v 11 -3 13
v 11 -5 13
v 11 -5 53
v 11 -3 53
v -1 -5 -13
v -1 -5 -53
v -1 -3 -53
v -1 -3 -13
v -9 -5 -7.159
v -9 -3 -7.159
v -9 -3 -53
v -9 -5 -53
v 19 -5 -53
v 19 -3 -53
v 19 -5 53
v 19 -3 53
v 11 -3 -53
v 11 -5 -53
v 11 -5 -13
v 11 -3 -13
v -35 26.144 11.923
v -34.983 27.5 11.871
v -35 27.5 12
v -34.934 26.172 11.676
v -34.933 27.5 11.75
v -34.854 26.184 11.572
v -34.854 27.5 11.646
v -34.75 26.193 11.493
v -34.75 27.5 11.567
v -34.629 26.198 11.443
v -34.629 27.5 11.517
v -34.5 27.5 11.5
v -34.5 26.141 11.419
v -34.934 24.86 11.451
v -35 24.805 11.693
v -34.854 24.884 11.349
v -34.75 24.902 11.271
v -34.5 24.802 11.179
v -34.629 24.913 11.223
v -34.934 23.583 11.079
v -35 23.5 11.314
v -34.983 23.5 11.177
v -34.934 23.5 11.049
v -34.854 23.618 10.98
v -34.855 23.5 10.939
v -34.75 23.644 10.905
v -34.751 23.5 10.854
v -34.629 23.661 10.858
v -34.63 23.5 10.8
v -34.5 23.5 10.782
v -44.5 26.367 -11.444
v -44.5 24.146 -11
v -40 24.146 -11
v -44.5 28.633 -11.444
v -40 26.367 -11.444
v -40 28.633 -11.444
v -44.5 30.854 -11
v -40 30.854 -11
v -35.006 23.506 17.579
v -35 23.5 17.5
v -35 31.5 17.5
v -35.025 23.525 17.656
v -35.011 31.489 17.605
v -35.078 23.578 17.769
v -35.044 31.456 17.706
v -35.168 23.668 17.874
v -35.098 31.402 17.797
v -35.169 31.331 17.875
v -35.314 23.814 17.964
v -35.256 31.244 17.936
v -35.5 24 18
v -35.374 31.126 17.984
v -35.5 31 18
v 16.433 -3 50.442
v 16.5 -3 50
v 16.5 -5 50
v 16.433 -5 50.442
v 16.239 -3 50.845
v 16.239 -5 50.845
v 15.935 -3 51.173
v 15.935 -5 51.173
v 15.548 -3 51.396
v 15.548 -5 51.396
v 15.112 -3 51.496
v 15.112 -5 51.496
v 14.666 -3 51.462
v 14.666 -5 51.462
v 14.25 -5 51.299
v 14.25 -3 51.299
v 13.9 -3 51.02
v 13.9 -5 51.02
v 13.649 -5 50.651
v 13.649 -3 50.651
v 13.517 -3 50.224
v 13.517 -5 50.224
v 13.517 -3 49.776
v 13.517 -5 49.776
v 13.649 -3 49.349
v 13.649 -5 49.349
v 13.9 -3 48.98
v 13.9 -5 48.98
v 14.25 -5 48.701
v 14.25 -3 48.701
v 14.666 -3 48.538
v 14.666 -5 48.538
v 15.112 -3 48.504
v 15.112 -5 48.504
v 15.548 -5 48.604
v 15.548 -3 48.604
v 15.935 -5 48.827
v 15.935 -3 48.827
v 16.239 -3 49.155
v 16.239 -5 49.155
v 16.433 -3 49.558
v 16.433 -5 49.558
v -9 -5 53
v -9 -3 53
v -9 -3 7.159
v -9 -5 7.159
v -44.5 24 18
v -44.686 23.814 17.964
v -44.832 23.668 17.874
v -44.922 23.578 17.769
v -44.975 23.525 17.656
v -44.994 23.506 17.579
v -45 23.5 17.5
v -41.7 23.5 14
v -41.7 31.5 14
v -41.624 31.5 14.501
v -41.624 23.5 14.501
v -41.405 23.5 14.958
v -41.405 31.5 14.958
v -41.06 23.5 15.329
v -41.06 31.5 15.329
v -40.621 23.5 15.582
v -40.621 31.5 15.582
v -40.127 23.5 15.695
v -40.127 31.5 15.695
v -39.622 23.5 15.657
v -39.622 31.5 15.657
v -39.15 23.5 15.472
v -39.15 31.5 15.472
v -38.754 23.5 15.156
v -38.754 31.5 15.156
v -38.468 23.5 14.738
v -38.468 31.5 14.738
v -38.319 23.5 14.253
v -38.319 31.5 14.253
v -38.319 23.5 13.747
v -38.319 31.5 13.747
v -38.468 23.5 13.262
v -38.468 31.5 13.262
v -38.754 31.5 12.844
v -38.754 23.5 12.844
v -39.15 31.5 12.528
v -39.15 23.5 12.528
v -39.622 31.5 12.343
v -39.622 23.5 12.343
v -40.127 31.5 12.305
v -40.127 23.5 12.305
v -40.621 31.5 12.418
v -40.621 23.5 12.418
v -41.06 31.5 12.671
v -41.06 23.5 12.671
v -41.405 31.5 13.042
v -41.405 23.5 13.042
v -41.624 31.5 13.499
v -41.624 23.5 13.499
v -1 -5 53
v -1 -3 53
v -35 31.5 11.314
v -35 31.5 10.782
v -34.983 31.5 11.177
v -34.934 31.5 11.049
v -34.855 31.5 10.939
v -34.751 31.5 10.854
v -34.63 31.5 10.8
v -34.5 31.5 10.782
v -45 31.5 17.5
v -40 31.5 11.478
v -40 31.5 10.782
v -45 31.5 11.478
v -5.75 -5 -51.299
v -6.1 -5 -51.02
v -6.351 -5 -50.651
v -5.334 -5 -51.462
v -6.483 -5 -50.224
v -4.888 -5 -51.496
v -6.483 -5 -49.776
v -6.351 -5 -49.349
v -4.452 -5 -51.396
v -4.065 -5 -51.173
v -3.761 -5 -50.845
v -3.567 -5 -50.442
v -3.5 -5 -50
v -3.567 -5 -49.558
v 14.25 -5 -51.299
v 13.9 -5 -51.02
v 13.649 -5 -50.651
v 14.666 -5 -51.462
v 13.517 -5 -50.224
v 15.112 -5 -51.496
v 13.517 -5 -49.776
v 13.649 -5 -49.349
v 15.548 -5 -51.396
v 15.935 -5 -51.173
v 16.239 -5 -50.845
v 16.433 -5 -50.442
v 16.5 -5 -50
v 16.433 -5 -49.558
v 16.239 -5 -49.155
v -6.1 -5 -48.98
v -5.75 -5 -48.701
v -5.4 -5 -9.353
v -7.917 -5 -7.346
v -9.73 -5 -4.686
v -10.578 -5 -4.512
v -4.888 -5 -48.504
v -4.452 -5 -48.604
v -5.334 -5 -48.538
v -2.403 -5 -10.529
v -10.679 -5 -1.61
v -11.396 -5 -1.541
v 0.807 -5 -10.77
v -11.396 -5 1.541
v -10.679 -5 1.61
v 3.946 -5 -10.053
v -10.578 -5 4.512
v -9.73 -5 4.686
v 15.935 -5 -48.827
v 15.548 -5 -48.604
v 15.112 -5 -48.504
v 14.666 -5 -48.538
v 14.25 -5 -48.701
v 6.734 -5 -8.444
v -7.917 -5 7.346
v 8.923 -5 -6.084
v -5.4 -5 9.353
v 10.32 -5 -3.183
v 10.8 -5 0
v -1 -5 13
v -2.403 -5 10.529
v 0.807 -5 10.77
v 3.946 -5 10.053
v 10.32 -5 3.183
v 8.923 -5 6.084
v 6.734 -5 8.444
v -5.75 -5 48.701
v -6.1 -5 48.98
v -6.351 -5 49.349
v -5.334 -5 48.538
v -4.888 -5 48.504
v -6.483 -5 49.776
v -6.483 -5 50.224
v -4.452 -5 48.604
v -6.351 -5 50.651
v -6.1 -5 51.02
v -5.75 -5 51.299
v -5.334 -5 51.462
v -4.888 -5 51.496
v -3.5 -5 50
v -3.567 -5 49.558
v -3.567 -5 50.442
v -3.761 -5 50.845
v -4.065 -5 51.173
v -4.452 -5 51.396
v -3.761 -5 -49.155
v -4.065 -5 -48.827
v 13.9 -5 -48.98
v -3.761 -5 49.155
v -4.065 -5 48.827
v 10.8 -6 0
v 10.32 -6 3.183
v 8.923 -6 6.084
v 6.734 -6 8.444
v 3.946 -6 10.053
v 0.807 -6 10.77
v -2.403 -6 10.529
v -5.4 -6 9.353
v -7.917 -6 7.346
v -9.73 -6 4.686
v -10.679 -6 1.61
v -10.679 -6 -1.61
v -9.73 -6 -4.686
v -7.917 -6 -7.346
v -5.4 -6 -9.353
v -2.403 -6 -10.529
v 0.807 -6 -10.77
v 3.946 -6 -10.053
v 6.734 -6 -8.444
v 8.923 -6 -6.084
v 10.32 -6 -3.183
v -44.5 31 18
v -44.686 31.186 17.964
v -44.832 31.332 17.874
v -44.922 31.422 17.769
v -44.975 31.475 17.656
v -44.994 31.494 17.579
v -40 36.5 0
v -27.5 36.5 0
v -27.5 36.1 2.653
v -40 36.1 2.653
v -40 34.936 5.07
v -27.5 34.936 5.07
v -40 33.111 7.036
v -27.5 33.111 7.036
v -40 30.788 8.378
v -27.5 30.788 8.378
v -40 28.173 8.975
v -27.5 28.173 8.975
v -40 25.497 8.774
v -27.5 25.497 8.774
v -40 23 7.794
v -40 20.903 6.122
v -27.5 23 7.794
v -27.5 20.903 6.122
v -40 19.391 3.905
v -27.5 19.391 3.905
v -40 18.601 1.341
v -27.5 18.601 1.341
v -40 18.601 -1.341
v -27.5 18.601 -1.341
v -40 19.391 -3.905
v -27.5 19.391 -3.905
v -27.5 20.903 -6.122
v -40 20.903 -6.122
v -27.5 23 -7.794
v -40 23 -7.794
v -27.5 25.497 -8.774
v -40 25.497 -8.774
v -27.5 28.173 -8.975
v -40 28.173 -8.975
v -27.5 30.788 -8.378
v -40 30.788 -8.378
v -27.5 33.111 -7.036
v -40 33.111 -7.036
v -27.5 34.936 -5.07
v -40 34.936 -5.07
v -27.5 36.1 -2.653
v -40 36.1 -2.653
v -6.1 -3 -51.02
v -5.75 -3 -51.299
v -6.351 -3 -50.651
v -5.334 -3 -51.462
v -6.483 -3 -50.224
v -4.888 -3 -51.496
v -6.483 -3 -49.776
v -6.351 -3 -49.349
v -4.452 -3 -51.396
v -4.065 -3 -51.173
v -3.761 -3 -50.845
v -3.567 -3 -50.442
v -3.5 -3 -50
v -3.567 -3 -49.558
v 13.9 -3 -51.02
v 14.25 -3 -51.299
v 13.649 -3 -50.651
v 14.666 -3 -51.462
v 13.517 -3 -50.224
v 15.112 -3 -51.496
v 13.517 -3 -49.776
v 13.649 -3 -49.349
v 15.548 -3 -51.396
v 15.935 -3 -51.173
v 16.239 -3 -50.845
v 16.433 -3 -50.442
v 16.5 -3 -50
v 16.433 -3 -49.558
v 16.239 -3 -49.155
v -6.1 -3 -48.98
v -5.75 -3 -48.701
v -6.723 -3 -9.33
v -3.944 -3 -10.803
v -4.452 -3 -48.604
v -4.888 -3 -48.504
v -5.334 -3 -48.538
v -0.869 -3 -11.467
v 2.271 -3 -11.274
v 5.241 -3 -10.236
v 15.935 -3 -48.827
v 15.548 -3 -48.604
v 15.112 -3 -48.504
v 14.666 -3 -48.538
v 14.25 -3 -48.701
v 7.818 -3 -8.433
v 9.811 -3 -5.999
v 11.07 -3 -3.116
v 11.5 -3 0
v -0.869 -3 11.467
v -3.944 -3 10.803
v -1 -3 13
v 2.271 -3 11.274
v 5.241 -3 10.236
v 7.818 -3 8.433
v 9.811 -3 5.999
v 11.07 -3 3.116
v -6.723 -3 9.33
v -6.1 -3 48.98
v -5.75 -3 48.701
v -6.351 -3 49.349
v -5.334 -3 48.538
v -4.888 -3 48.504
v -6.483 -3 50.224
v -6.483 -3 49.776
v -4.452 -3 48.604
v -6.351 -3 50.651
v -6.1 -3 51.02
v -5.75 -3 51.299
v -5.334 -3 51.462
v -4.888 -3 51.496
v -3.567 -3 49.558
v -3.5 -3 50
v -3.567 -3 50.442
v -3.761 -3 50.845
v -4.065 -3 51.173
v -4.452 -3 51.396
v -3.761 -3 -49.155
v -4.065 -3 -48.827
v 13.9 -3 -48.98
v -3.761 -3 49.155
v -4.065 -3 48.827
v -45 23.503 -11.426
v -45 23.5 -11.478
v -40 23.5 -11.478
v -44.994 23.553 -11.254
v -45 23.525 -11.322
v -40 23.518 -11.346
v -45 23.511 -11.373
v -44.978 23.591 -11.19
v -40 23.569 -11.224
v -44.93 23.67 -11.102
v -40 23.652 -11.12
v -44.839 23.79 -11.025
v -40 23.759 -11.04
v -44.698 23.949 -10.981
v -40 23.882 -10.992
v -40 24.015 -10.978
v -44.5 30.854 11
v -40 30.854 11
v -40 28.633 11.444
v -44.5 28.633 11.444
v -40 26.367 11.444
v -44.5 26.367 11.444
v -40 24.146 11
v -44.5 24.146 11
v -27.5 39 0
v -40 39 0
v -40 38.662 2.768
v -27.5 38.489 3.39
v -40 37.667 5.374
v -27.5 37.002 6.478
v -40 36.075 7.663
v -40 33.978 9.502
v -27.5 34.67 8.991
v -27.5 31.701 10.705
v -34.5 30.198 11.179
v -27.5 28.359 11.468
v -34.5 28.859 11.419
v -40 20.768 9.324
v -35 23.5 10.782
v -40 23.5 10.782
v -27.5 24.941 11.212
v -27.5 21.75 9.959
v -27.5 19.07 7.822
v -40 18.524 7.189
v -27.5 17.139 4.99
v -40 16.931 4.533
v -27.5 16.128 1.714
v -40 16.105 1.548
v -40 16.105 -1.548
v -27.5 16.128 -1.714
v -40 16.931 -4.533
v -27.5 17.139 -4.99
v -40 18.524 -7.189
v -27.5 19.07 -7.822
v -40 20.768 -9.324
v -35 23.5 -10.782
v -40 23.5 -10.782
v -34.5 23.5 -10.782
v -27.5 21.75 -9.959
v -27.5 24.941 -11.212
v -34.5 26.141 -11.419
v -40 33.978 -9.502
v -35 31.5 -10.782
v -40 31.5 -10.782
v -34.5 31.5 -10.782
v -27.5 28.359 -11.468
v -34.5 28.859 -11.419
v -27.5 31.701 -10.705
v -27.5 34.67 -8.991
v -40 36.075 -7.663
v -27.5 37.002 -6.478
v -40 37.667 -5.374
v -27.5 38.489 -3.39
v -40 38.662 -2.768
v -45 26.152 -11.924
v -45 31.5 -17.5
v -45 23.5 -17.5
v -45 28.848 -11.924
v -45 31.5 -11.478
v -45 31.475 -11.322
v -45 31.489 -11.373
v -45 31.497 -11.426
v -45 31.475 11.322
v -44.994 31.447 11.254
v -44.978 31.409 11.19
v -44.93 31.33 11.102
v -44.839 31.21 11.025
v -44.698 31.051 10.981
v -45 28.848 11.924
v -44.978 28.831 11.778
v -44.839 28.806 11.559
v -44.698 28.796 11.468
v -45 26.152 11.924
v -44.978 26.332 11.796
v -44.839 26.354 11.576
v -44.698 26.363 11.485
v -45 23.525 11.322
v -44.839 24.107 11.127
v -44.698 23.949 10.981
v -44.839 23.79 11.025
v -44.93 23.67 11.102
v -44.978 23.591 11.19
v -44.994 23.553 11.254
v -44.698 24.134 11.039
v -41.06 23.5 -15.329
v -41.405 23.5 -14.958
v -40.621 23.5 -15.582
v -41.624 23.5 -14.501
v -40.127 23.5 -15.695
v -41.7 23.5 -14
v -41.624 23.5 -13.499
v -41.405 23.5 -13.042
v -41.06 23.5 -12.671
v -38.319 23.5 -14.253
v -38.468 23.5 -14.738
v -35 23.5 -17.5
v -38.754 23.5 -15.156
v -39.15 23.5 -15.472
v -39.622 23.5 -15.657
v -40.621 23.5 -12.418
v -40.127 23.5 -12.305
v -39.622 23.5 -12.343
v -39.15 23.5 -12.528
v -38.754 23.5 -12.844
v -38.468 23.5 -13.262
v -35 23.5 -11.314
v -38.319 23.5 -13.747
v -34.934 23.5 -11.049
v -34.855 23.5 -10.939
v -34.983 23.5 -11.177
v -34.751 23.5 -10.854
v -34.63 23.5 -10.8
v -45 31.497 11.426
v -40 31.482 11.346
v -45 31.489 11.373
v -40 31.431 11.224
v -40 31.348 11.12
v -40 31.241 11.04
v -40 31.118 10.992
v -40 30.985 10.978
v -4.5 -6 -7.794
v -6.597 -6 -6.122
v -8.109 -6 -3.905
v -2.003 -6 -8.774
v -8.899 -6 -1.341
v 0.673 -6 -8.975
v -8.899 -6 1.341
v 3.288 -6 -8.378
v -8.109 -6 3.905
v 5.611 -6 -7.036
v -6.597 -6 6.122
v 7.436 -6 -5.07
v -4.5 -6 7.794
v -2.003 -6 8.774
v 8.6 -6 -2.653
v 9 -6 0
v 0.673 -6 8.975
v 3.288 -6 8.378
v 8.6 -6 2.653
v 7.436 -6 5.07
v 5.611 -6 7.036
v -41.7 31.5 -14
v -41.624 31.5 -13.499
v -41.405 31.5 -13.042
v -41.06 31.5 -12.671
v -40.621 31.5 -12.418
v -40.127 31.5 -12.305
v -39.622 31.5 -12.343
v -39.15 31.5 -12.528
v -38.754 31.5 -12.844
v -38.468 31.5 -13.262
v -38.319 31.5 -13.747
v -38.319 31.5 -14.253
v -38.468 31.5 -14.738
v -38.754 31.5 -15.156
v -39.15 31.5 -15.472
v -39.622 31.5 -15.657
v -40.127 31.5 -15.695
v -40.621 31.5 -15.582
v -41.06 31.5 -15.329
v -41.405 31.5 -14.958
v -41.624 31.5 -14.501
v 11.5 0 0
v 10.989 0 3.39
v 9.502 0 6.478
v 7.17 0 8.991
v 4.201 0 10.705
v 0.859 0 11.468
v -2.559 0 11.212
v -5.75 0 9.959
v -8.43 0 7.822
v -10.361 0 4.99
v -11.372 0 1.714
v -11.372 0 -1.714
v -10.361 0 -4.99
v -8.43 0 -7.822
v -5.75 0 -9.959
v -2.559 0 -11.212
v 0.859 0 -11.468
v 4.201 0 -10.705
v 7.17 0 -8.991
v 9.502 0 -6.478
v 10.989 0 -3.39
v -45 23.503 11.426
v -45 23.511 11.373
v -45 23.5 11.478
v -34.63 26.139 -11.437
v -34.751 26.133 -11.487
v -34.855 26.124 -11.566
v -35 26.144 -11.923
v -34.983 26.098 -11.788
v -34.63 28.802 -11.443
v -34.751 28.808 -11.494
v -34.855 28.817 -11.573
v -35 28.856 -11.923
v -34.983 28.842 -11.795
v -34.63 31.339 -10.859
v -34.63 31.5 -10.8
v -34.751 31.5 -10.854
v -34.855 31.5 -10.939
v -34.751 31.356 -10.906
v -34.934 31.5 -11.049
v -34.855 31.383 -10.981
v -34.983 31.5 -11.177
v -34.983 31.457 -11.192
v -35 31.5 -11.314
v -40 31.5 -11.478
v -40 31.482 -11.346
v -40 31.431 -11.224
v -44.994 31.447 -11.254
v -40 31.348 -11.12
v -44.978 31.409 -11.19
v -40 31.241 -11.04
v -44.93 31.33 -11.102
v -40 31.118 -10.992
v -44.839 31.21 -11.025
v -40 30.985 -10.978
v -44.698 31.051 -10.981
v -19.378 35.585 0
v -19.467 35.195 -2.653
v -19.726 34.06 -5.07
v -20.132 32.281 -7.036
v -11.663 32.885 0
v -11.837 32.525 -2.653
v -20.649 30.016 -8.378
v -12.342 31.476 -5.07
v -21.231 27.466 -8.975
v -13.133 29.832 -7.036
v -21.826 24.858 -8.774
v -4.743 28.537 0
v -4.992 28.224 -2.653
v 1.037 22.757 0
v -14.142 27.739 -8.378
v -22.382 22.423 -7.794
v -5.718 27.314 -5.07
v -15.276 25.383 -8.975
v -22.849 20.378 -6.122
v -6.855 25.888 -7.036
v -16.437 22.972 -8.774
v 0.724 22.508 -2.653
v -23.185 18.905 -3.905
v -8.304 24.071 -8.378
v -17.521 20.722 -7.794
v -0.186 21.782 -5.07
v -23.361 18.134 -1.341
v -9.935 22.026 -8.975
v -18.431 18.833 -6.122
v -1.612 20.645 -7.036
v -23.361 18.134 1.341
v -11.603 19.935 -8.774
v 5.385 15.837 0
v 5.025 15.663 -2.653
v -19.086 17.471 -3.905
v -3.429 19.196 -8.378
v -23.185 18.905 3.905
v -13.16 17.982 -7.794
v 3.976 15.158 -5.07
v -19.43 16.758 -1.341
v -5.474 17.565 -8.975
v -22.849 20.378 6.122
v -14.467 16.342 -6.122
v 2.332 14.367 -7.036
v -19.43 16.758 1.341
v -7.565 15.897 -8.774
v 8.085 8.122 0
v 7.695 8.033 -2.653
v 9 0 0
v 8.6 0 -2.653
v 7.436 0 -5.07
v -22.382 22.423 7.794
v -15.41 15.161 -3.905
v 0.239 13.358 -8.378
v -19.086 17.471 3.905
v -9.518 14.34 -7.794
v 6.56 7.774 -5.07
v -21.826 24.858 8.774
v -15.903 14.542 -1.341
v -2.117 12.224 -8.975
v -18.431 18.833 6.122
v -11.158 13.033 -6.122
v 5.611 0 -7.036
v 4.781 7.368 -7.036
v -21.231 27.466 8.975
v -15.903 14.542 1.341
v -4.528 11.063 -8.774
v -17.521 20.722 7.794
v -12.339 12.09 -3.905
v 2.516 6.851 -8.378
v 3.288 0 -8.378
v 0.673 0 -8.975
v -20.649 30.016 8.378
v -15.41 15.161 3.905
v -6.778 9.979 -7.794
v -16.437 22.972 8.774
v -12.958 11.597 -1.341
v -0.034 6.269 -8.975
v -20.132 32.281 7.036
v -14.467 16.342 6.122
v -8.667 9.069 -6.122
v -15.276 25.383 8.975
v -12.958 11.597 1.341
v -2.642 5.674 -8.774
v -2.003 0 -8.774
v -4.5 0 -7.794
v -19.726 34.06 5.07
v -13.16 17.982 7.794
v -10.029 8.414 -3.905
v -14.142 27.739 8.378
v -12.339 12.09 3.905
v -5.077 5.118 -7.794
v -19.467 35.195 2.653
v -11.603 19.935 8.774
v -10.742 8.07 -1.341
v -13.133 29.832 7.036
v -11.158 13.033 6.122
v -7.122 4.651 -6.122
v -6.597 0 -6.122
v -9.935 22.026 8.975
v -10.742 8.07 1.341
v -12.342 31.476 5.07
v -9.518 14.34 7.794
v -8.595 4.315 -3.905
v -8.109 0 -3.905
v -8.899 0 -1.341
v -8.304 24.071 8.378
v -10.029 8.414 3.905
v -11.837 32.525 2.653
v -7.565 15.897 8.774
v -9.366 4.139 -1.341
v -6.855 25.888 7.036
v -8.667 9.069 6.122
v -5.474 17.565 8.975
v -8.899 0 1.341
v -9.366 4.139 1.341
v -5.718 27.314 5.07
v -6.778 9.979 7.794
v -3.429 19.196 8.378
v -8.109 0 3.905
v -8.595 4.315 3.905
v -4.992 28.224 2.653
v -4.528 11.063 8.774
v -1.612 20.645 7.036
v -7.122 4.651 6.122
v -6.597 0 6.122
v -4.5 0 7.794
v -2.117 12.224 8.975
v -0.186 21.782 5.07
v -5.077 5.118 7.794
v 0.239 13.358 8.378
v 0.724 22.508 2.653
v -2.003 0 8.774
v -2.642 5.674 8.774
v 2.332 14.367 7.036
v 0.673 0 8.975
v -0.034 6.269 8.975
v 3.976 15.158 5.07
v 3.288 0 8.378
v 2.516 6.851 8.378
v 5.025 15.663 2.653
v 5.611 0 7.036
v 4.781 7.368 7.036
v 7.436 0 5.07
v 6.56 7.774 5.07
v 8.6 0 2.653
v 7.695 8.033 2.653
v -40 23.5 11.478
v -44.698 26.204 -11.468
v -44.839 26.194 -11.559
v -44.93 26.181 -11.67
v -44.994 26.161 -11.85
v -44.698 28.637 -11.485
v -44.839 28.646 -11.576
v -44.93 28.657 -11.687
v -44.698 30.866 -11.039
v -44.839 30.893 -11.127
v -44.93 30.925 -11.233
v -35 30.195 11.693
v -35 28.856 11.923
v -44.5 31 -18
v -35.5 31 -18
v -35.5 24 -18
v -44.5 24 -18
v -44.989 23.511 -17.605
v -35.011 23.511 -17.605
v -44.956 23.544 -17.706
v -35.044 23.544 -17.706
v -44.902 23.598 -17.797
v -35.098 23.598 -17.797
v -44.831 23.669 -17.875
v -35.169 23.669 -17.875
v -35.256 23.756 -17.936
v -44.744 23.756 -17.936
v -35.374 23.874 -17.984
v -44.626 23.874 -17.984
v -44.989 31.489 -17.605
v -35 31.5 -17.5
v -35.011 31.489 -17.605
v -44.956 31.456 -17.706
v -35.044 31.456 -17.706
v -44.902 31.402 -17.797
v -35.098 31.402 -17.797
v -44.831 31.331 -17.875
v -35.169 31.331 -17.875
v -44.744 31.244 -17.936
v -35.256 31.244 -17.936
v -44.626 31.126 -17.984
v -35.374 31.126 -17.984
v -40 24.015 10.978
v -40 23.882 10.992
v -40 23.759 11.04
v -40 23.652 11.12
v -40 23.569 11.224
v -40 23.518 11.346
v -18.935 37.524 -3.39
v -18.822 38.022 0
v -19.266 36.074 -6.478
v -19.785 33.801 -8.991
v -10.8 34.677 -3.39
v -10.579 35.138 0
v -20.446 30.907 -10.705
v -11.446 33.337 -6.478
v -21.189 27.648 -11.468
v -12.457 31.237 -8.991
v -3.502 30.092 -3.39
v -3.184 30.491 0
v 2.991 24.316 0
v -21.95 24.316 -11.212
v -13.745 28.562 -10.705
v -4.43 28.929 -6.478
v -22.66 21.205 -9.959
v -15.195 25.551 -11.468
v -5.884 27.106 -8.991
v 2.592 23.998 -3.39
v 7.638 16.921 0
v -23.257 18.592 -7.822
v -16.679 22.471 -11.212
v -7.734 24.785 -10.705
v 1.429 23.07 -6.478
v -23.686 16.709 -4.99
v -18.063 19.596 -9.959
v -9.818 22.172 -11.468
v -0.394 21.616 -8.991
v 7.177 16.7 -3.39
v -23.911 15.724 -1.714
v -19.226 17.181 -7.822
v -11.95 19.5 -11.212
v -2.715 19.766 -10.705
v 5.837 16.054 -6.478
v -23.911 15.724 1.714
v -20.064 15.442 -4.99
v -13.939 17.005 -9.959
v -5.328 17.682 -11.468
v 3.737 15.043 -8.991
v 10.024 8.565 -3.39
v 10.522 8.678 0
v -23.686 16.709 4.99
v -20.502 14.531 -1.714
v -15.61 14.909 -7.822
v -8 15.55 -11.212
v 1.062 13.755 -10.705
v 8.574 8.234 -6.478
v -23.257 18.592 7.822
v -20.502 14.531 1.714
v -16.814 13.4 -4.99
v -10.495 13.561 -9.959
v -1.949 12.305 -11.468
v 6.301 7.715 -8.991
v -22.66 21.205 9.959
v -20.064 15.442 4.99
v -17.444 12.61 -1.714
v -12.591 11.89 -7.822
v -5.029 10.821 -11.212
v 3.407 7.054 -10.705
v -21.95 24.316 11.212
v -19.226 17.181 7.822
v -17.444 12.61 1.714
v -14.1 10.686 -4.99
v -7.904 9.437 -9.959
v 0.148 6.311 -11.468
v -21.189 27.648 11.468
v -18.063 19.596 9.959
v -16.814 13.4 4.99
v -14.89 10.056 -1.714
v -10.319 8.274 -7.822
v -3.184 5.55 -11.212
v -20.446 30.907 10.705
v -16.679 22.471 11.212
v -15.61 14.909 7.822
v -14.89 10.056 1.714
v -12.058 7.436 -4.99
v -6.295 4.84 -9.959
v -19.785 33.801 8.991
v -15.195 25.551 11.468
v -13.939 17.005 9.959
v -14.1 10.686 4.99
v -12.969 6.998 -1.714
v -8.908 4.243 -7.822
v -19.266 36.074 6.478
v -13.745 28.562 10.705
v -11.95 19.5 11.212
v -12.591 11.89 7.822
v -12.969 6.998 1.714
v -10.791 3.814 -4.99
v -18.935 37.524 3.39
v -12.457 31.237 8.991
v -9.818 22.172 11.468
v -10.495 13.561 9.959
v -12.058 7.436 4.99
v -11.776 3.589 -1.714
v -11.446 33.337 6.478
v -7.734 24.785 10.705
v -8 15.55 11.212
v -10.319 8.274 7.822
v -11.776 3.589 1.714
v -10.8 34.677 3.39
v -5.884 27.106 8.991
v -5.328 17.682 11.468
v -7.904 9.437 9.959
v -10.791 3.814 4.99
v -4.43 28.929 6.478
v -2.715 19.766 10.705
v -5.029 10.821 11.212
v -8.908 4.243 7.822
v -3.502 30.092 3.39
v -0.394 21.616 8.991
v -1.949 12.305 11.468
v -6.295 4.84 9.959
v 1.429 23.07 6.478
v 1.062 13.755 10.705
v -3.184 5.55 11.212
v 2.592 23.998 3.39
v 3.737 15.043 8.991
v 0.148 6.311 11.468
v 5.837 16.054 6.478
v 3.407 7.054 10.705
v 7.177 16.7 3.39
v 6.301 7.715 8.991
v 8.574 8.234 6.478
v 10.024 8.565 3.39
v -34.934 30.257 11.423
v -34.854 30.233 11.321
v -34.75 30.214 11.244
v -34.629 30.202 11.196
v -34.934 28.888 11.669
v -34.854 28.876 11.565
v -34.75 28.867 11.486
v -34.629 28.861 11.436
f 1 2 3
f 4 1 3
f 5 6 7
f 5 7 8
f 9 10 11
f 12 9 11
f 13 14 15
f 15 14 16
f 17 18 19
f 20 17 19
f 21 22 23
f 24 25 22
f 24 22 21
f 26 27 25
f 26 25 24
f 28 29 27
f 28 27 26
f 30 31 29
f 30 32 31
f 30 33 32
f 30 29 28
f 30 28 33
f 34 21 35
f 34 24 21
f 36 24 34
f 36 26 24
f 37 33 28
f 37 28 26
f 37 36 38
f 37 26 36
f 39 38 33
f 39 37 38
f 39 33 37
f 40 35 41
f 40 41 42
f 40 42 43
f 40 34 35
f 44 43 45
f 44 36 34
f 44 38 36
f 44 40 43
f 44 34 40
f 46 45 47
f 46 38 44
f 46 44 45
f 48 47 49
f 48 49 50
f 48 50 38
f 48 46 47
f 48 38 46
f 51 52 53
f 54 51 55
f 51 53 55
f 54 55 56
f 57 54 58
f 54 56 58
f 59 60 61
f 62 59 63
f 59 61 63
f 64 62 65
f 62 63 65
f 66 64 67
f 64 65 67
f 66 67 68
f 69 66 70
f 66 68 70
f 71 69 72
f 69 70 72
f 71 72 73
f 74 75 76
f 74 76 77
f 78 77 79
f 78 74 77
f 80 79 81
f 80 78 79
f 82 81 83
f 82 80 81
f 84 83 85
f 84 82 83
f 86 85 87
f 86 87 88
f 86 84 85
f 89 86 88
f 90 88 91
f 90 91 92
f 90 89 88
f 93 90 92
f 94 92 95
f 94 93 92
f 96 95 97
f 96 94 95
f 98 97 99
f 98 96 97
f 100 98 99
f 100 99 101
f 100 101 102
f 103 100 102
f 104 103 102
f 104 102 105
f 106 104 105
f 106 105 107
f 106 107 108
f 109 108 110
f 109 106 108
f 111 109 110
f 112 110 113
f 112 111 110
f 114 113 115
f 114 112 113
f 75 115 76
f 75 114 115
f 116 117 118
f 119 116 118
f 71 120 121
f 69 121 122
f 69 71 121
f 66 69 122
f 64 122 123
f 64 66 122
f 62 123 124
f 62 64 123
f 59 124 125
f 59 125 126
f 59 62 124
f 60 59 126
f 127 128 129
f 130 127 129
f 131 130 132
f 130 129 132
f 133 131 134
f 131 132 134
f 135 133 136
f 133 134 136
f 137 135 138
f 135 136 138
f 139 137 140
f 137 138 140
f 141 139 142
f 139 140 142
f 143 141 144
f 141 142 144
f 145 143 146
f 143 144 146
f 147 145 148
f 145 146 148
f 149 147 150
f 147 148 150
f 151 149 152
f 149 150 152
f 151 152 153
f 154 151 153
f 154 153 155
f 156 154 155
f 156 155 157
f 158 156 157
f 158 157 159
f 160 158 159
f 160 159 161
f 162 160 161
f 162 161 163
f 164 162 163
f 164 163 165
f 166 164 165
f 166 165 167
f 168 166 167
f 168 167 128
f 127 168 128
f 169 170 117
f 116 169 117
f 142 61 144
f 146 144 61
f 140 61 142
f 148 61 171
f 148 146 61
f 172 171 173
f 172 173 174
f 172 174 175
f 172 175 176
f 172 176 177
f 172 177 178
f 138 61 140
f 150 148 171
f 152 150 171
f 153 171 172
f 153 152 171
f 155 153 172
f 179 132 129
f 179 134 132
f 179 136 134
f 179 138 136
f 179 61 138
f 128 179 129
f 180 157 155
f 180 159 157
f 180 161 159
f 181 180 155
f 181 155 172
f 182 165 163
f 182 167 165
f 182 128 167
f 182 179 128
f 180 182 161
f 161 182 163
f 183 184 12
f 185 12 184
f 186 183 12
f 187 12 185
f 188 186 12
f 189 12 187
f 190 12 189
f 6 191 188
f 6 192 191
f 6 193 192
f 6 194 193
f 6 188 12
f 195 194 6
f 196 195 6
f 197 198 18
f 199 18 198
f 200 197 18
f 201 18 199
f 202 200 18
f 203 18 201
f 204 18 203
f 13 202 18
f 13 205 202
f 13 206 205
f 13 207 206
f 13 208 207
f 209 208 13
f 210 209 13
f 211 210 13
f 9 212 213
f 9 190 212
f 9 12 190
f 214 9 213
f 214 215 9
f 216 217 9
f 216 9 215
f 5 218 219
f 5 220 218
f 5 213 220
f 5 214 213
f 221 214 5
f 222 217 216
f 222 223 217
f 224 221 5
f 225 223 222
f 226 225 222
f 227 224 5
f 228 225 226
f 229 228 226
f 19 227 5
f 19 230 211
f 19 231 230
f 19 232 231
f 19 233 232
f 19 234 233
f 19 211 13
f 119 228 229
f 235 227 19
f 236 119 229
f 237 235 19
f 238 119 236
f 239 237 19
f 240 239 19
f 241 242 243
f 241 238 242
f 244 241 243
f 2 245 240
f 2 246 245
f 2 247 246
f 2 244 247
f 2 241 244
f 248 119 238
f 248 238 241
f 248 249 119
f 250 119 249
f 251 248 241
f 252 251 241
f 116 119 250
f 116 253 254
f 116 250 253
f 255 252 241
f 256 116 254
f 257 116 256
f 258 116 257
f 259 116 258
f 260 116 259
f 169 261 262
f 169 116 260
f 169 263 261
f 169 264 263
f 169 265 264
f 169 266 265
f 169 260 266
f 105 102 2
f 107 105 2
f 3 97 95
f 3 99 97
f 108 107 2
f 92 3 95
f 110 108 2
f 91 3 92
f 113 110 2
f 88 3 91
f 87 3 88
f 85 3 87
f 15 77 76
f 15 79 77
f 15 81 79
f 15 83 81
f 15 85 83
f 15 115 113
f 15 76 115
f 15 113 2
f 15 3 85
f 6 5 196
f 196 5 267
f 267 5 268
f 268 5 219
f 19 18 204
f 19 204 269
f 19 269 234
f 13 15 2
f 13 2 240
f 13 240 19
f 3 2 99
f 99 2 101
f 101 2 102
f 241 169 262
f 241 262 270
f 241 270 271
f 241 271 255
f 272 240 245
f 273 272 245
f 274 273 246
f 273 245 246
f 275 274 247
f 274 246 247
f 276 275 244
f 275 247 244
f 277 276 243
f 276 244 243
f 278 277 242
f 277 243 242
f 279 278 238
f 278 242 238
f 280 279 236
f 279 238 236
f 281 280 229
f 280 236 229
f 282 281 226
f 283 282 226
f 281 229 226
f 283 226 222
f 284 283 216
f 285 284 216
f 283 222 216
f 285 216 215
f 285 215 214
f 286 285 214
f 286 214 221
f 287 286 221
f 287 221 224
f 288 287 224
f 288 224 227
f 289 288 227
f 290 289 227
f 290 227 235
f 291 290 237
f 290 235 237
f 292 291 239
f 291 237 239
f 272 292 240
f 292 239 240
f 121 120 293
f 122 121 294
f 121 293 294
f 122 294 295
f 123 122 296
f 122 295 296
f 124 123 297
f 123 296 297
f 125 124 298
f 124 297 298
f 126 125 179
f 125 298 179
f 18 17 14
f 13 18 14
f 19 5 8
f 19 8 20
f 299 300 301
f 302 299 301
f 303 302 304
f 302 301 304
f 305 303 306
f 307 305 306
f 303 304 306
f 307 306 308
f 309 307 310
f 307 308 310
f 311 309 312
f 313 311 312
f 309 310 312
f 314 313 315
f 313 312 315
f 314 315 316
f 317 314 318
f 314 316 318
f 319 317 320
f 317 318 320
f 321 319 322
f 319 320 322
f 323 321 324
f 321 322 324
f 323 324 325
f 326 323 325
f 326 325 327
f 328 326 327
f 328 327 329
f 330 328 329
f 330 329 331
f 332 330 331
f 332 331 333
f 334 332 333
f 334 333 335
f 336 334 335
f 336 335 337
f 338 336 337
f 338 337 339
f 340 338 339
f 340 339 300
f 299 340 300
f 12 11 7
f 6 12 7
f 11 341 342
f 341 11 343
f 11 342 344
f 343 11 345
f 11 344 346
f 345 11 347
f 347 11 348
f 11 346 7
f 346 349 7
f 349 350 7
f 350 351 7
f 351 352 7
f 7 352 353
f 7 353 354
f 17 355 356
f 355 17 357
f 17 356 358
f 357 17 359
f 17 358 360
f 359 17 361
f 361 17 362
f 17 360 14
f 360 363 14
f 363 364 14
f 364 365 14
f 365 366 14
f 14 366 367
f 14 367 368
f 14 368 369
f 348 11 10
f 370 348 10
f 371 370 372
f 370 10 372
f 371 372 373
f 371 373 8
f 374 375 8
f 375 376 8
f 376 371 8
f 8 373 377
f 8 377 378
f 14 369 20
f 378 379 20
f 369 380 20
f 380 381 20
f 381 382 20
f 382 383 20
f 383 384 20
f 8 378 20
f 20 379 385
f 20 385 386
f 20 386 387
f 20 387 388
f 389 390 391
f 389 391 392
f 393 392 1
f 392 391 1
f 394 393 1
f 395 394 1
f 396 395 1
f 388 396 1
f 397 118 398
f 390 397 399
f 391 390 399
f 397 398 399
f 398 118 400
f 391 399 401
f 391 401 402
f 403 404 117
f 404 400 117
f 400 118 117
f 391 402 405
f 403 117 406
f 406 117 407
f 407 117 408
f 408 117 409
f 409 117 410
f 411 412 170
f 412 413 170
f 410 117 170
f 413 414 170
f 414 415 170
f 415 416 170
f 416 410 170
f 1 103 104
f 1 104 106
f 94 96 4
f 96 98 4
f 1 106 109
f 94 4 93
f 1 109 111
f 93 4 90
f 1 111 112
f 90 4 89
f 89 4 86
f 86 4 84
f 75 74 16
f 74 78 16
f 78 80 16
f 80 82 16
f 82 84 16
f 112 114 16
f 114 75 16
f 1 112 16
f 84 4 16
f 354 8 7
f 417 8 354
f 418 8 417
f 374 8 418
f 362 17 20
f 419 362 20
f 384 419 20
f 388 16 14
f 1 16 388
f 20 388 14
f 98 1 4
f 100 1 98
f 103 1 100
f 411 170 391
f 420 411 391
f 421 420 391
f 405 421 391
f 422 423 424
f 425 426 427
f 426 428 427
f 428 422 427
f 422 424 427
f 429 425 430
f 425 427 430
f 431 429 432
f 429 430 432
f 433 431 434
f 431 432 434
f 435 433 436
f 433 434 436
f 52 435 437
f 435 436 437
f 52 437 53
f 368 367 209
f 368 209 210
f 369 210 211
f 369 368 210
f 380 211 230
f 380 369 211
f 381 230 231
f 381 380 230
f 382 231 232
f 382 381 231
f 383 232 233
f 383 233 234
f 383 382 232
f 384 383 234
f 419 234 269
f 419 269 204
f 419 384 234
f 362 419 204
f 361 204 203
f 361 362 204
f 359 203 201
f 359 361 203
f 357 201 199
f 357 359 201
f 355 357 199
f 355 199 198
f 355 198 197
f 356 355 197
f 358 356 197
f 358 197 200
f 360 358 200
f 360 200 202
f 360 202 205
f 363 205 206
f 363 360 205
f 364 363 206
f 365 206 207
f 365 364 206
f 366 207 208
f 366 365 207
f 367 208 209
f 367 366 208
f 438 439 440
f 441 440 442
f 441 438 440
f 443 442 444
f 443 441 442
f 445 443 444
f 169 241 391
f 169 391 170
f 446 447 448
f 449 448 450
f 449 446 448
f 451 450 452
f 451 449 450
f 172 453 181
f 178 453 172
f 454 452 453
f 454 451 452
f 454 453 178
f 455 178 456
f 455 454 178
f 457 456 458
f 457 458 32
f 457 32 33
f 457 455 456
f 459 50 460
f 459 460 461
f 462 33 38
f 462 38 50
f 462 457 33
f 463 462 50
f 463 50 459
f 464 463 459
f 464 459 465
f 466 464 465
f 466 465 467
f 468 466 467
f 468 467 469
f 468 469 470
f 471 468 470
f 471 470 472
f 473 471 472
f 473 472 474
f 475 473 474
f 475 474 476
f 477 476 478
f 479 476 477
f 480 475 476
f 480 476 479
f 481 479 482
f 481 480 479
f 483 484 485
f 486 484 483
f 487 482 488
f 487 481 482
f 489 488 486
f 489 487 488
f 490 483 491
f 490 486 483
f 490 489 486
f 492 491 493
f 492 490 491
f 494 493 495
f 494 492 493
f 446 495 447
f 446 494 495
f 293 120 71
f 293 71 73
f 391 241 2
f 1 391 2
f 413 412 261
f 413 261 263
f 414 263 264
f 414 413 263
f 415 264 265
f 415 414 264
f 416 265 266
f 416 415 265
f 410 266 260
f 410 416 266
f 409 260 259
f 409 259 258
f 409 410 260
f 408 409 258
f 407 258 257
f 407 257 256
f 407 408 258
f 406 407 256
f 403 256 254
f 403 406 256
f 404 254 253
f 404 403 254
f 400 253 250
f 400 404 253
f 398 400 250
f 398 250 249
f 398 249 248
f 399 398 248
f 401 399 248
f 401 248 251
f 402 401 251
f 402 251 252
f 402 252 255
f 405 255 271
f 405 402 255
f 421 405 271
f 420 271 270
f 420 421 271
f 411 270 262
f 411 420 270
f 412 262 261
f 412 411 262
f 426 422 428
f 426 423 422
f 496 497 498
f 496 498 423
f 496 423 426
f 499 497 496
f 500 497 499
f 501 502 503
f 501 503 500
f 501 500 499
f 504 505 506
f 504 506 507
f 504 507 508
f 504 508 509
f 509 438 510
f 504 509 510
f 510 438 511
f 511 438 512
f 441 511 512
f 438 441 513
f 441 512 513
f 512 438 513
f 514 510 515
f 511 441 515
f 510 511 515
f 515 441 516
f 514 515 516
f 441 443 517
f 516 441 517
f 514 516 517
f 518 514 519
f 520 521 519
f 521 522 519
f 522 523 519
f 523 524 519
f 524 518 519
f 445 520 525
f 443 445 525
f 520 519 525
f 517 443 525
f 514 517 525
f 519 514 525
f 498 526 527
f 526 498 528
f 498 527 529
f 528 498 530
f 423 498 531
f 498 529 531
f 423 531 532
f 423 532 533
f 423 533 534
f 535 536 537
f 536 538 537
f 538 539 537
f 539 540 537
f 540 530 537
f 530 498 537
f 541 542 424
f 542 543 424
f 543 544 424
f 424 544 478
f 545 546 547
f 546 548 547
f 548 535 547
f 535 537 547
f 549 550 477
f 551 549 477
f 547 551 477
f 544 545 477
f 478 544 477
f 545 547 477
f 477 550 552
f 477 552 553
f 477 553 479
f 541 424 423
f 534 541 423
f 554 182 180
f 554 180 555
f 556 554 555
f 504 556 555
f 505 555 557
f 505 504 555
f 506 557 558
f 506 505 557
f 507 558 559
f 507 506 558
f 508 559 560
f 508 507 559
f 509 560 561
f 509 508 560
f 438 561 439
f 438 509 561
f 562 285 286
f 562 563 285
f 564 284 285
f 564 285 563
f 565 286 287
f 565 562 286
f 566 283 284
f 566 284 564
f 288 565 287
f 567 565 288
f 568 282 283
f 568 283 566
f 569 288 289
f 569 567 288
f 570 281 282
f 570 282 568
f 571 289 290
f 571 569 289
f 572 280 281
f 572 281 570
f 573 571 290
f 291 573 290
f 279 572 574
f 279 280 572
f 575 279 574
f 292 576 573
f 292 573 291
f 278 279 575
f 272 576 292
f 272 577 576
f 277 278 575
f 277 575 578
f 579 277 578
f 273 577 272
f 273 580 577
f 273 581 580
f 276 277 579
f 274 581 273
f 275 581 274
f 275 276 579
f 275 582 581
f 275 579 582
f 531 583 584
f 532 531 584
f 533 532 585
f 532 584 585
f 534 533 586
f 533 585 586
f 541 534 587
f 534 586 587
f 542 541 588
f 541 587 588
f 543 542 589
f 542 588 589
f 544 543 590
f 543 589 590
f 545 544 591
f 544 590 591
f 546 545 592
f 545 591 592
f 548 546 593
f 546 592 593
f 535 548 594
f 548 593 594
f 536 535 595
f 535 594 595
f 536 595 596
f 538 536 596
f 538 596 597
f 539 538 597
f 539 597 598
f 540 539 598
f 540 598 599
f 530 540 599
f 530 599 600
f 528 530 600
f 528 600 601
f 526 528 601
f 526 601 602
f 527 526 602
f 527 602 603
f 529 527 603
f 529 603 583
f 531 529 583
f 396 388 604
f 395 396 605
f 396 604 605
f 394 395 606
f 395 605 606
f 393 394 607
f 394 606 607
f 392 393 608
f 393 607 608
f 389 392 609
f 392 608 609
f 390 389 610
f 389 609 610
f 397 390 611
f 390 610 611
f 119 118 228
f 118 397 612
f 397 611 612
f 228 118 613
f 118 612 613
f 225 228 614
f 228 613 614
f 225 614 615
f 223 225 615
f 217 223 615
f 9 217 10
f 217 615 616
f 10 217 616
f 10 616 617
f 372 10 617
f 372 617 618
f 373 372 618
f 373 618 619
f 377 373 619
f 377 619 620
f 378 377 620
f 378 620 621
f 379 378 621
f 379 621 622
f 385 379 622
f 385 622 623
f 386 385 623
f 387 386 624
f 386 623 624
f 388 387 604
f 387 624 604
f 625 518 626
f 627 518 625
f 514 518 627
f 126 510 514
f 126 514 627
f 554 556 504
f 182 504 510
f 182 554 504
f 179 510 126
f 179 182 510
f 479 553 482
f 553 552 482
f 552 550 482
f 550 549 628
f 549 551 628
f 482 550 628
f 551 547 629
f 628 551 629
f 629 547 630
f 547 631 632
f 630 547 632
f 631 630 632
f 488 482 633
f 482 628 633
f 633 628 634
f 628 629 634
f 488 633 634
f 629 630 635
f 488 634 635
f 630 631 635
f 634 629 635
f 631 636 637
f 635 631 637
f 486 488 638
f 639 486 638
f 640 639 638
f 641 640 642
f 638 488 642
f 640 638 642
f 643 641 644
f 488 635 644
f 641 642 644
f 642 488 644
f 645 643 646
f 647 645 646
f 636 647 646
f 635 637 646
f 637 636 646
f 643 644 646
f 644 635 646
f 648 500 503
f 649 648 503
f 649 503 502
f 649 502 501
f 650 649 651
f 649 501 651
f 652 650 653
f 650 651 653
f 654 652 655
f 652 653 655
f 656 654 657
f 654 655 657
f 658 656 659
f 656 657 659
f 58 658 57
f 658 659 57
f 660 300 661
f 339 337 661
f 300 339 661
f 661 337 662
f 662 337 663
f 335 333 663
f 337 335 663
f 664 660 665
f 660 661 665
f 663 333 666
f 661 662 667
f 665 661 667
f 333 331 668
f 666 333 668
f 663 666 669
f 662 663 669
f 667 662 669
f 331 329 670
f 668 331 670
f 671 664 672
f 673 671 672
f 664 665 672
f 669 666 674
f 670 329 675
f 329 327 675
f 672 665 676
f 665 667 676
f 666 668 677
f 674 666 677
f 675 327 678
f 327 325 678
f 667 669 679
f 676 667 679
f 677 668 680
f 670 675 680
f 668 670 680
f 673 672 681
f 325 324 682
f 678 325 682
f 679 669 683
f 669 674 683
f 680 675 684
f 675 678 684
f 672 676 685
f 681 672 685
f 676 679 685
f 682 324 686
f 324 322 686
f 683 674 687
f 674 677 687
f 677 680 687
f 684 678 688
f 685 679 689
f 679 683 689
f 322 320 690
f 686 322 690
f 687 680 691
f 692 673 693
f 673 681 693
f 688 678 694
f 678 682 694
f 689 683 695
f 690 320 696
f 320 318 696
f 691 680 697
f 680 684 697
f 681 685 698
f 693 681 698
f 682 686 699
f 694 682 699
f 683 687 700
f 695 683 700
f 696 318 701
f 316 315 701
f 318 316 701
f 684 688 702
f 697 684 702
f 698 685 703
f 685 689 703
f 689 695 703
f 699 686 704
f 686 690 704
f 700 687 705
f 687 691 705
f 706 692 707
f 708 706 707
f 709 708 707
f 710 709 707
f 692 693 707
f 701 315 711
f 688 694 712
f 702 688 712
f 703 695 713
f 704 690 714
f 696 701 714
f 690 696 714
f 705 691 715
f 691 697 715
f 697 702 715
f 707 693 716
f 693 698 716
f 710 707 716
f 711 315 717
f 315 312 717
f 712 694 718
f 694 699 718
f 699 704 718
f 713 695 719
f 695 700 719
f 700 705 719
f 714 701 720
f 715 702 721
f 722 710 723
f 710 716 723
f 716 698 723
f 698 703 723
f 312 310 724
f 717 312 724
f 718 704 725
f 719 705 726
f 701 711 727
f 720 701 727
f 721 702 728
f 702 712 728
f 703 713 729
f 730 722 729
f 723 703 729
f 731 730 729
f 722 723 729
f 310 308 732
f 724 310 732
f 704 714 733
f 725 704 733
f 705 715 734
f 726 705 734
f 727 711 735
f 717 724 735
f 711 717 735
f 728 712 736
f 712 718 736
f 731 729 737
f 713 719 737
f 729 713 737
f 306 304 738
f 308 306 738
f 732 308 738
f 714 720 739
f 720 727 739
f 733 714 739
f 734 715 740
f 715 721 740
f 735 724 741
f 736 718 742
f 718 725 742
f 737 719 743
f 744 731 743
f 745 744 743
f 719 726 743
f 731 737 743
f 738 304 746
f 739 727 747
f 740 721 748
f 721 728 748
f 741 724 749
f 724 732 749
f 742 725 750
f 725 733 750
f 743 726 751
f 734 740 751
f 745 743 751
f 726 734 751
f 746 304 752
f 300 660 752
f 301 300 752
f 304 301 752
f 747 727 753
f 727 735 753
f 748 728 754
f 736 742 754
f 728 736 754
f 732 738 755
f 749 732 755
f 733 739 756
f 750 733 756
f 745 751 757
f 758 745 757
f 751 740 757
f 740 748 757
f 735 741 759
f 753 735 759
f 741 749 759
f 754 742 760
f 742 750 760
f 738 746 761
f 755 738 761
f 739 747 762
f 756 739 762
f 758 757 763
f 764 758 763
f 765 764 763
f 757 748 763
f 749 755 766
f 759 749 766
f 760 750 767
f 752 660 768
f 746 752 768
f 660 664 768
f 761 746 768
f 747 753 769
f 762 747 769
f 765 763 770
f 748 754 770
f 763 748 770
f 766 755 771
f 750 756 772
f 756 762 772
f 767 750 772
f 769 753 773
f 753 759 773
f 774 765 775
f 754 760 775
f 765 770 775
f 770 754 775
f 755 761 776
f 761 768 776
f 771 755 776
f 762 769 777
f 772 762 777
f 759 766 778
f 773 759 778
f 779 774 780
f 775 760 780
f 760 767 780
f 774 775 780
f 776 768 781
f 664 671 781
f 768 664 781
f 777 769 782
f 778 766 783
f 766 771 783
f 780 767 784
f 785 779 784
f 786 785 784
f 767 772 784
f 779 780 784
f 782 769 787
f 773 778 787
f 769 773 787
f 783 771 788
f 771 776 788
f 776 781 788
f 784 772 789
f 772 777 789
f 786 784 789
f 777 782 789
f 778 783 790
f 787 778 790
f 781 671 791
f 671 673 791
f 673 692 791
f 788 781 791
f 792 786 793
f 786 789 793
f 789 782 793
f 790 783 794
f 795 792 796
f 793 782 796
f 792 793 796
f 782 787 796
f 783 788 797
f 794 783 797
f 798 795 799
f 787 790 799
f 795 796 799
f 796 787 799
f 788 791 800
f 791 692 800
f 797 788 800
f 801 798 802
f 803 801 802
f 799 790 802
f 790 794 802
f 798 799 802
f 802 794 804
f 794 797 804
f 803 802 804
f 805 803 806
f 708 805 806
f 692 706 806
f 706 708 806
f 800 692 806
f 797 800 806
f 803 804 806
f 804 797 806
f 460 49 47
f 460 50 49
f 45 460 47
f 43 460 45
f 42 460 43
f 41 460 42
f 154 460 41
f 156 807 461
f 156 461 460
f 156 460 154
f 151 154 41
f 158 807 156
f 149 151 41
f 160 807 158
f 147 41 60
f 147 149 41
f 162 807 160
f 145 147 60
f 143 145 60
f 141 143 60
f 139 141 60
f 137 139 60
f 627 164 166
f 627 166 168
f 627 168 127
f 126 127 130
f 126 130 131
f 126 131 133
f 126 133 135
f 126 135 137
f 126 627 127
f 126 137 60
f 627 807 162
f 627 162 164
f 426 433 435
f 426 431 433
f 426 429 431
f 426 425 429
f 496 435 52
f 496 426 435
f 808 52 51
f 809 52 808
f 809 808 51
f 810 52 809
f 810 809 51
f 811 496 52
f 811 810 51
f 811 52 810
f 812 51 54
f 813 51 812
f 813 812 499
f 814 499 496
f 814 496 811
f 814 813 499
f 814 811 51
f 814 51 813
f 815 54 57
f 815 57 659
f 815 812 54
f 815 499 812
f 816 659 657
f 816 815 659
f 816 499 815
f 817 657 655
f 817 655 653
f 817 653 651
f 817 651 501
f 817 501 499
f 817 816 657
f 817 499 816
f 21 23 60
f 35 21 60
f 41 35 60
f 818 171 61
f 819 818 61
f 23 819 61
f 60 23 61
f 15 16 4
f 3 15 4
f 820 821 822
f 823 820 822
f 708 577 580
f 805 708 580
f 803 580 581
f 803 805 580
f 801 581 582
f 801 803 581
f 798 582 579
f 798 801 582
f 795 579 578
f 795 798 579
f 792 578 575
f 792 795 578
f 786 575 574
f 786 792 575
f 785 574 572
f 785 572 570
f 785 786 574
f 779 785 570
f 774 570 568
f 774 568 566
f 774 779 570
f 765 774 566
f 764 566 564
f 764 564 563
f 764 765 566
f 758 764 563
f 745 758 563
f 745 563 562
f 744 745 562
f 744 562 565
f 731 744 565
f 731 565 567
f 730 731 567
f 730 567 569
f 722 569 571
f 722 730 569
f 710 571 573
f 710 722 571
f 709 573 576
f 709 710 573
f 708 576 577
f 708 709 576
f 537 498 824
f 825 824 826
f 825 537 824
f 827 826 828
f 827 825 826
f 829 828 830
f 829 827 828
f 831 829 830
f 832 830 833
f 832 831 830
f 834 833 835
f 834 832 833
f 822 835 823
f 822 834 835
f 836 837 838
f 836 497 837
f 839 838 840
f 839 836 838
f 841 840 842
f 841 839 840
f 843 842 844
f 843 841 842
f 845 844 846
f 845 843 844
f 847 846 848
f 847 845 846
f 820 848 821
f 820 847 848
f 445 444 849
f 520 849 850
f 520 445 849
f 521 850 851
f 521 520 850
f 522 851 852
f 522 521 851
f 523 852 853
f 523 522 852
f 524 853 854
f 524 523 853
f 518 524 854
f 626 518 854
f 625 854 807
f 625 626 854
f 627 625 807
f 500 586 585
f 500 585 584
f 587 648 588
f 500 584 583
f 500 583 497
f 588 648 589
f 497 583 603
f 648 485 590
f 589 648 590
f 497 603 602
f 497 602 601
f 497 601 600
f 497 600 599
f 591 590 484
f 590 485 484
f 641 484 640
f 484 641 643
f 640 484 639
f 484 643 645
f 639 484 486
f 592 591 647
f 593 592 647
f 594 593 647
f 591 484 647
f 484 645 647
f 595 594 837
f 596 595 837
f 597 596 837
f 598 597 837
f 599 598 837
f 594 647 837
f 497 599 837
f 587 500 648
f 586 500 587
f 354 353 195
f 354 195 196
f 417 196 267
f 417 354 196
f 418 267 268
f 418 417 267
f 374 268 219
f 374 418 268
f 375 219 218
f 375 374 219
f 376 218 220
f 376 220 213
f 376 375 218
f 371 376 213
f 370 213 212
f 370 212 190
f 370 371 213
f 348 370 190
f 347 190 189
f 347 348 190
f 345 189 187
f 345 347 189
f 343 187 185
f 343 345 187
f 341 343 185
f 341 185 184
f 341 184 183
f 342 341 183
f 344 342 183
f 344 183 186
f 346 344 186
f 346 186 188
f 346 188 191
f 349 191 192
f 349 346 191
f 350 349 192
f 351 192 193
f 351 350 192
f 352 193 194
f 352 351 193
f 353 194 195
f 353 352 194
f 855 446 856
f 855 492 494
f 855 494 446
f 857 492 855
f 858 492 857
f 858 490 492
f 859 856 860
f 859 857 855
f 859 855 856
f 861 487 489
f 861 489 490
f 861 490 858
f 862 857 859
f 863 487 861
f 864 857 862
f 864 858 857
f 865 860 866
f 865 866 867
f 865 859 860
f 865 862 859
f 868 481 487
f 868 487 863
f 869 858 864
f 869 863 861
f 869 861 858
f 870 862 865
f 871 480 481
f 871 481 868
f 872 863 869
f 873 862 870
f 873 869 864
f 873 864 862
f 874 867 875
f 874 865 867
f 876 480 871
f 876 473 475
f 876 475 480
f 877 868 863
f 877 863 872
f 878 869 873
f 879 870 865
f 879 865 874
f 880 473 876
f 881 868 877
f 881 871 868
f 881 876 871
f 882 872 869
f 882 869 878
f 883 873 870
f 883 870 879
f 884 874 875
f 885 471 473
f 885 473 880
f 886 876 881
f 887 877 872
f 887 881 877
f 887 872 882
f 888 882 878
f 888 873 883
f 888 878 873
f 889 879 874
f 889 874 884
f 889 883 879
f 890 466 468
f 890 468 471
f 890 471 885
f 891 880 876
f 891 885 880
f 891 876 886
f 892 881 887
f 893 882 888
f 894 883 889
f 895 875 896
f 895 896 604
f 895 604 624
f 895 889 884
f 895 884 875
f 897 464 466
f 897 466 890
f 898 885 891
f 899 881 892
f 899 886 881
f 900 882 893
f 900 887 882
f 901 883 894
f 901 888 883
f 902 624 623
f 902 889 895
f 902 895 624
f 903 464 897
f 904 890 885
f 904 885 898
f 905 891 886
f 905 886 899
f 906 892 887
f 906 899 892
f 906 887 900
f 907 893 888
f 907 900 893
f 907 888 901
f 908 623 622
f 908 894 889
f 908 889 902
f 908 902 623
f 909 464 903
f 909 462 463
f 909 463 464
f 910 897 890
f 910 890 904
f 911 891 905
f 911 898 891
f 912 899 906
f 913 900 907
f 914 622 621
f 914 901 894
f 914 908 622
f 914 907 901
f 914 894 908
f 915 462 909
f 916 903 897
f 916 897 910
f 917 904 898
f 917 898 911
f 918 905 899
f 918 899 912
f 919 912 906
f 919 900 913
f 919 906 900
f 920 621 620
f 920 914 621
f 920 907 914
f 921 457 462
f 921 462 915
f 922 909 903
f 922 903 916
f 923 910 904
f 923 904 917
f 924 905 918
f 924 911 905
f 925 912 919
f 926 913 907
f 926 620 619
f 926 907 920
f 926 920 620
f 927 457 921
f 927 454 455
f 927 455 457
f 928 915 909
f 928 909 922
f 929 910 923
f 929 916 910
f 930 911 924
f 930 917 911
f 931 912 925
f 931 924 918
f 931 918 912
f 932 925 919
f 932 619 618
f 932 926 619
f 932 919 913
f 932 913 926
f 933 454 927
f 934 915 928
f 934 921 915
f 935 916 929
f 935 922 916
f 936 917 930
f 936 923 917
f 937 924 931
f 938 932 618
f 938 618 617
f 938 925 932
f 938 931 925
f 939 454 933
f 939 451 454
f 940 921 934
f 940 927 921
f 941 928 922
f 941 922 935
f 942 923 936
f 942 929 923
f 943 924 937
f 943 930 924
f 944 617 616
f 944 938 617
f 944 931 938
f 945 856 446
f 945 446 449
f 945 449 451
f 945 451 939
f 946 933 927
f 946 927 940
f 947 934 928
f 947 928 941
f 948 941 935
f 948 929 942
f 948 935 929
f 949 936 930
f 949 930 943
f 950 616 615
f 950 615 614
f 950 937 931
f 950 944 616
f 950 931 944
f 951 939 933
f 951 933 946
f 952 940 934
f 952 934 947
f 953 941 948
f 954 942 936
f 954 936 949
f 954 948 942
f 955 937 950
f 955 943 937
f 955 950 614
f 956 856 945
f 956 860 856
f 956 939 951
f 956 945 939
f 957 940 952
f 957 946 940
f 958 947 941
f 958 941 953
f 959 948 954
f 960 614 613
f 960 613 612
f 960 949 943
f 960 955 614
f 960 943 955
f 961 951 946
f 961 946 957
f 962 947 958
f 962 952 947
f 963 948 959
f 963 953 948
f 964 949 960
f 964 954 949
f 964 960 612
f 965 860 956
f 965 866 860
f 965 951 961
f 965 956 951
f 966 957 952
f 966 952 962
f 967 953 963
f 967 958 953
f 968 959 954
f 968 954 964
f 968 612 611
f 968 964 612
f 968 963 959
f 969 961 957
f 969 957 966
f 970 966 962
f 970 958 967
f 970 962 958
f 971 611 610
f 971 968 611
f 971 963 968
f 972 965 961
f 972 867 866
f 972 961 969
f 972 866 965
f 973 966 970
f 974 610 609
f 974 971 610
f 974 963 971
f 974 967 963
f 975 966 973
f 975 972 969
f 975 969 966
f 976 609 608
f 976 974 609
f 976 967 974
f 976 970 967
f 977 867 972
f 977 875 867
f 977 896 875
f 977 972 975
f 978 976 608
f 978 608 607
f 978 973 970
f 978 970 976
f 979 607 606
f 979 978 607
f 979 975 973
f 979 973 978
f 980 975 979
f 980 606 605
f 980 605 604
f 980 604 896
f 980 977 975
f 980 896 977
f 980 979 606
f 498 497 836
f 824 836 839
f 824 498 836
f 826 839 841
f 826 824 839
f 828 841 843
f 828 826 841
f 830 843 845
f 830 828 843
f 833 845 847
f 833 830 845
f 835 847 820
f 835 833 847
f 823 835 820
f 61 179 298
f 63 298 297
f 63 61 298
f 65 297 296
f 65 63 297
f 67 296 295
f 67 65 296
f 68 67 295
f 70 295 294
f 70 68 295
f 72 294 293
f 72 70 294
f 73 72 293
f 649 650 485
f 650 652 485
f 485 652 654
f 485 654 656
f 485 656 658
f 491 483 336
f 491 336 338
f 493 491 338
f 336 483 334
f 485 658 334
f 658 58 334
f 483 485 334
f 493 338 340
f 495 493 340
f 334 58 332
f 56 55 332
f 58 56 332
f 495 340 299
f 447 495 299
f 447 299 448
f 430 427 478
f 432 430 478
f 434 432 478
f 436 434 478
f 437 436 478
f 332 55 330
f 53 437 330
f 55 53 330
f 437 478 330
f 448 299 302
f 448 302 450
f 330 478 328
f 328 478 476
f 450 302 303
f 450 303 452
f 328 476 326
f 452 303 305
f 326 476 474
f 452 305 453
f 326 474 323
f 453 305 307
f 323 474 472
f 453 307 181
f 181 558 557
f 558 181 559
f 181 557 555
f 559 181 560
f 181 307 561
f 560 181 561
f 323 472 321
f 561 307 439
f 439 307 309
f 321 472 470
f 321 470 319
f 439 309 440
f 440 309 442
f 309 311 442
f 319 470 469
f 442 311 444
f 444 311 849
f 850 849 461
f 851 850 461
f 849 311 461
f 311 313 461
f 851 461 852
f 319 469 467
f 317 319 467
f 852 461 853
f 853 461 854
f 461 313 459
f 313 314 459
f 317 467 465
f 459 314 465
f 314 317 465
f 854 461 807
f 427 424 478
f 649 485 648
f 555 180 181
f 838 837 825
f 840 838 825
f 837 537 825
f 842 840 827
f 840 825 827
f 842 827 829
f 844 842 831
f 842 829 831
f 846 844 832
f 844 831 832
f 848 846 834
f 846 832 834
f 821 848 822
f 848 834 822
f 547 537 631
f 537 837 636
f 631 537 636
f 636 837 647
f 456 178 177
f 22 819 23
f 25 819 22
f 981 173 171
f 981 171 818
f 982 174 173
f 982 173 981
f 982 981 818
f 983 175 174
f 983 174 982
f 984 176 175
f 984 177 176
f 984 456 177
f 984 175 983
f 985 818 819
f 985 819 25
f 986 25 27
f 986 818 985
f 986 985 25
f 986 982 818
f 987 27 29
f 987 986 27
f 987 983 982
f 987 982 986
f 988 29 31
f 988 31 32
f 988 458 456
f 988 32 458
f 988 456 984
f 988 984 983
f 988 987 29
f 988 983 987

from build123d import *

# Parameters (mm, degrees)
SWEEP_1_PROFILE_R   = 11.5
SWEEP_1_PROFILE_R_2 = 9
EXTRUDE_1_DEPTH     = 5
SKETCH_31_R         = 1.7
CUT_EXTRUDE_1_DEPTH = 26
FILLET_1_R          = 0.5
SKETCH_32_R         = 11.5
SKETCH_32_R_2       = 9
EXTRUDE_2_DEPTH     = 5
EXTRUDE_START       = -2
SKETCH_33_R         = 1.5
EXTRUDE_3_DEPTH     = 2
SKETCH_34_W         = 12
SKETCH_34_H         = 40
CUT_EXTRUDE_2_DEPTH = 2
SKETCH_35_R         = 10.8
SKETCH_35_R_2       = 9
EXTRUDE_4_DEPTH     = 1


with BuildPart() as part:
    # 扫描-薄件1: sweep along a path in 草图1
    with BuildLine(Plane.XY) as sweep_1_path:
        Line((-40, 27.5), (-27.5, 27.5))
        ThreePointArc((-27.5, 27.5), (-8.054563517, 19.445436483), (0, 0))
    # 扫描-薄件1 profile (on start of the path) → 扫描-薄件1 (sweep)
    with BuildSketch(Plane(origin=(-40, 27.5, 0), x_dir=(0, 1, 0), z_dir=(1, 0, 0))):
        Circle(SWEEP_1_PROFILE_R)
        Circle(SWEEP_1_PROFILE_R_2, mode=Mode.SUBTRACT)
    sweep(path=sweep_1_path.line)

    # 草图30 → 凸台-拉伸1 (add, symmetric)
    with BuildSketch(Plane.ZY.offset(40)):
        with BuildLine():
            ThreePointArc((-10.781929326, 23.5), (-11.5, 27.5), (-10.781929326, 31.5))
            Line((-10.781929326, 31.5), (-18, 31.5))
            Line((-18, 31.5), (-18, 23.5))
            Line((-18, 23.5), (-10.781929326, 23.5))
        make_face()
        with BuildLine():
            Line((18, 31.5), (10.781929326, 31.5))
            ThreePointArc((10.781929326, 31.5), (11.319058867, 29.531971056), (11.5, 27.5))
            ThreePointArc((11.5, 27.5), (11.319058867, 25.468028944), (10.781929326, 23.5))
            Line((10.781929326, 23.5), (18, 23.5))
            Line((18, 23.5), (18, 31.5))
        make_face()
    extrude(amount=EXTRUDE_1_DEPTH, both=True)

    # 草图31 → 切除-拉伸1 (cut)
    with BuildSketch(Plane(origin=(0, 31.5, 0), x_dir=(1, 0, 0), z_dir=(0, 1, 0))):
        with Locations(Location((-40, 14, 0), (0, 0, 180))):
            Circle(SKETCH_31_R)
        with Locations(Location((-40, -14, 0), (0, 0, 180))):
            Circle(SKETCH_31_R)
    extrude(amount=-CUT_EXTRUDE_1_DEPTH, mode=Mode.SUBTRACT)

    # 圆角1
    fillet_1_edges = [part.edges().sort_by_distance(p)[0] for p in [
        (-35, 27.5, -18),
        (-40, 31.5, -18),
        (-40, 23.5, -18),
        (-42.5, 23.5, -10.781929326),
        (-45, 27.5, -11.5),
        (-42.5, 31.5, -10.781929326),
        (-45, 27.5, -18),
        (-35, 27.5, -11.5),
        (-42.5, 31.5, 10.781929326),
        (-45, 27.5, 11.5),
        (-42.5, 23.5, 10.781929326),
        (-45, 27.5, 18),
        (-40, 23.5, 18),
        (-40, 31.5, 18),
        (-35, 27.5, 11.5),
        (-35, 27.5, 18),
    ]]
    fillet(fillet_1_edges, radius=FILLET_1_R)

    # 草图32 → 凸台-拉伸2 (add)
    with BuildSketch(Plane.XZ):
        Circle(SKETCH_32_R)
        Circle(SKETCH_32_R_2, mode=Mode.SUBTRACT)
    extrude(amount=EXTRUDE_2_DEPTH)

    # 草图33 → 凸台-拉伸3 (add)
    with BuildSketch(Plane.XZ.offset(5).offset(EXTRUDE_START)):
        with BuildLine():
            Line((-9, -7.158910532), (-9, -53))
            Line((-9, -53), (19, -53))
            Line((19, -53), (19, 53))
            Line((19, 53), (-9, 53))
            Line((-9, 53), (-9, 7.158910532))
            ThreePointArc((-9, 7.158910532), (11.5, 0), (-9, -7.158910532))
        make_face()
        with Locations((-5, 50)):
            Circle(SKETCH_33_R, mode=Mode.SUBTRACT)
        with Locations((15, 50)):
            Circle(SKETCH_33_R, mode=Mode.SUBTRACT)
        with Locations((-5, -50)):
            Circle(SKETCH_33_R, mode=Mode.SUBTRACT)
        with Locations((15, -50)):
            Circle(SKETCH_33_R, mode=Mode.SUBTRACT)
    extrude(amount=EXTRUDE_3_DEPTH)

    # 草图34 → 切除-拉伸2 (cut)
    with BuildSketch(Plane.XZ.offset(5)):
        with Locations((5, 33)):
            Rectangle(SKETCH_34_W, SKETCH_34_H)
        with Locations((5, -33)):
            Rectangle(SKETCH_34_W, SKETCH_34_H)
    extrude(amount=-CUT_EXTRUDE_2_DEPTH, mode=Mode.SUBTRACT)

    # 草图35 → 凸台-拉伸4 (add)
    with BuildSketch(Plane.XZ.offset(5)):
        Circle(SKETCH_35_R)
        Circle(SKETCH_35_R_2, mode=Mode.SUBTRACT)
    extrude(amount=EXTRUDE_4_DEPTH)


solid = part.part
